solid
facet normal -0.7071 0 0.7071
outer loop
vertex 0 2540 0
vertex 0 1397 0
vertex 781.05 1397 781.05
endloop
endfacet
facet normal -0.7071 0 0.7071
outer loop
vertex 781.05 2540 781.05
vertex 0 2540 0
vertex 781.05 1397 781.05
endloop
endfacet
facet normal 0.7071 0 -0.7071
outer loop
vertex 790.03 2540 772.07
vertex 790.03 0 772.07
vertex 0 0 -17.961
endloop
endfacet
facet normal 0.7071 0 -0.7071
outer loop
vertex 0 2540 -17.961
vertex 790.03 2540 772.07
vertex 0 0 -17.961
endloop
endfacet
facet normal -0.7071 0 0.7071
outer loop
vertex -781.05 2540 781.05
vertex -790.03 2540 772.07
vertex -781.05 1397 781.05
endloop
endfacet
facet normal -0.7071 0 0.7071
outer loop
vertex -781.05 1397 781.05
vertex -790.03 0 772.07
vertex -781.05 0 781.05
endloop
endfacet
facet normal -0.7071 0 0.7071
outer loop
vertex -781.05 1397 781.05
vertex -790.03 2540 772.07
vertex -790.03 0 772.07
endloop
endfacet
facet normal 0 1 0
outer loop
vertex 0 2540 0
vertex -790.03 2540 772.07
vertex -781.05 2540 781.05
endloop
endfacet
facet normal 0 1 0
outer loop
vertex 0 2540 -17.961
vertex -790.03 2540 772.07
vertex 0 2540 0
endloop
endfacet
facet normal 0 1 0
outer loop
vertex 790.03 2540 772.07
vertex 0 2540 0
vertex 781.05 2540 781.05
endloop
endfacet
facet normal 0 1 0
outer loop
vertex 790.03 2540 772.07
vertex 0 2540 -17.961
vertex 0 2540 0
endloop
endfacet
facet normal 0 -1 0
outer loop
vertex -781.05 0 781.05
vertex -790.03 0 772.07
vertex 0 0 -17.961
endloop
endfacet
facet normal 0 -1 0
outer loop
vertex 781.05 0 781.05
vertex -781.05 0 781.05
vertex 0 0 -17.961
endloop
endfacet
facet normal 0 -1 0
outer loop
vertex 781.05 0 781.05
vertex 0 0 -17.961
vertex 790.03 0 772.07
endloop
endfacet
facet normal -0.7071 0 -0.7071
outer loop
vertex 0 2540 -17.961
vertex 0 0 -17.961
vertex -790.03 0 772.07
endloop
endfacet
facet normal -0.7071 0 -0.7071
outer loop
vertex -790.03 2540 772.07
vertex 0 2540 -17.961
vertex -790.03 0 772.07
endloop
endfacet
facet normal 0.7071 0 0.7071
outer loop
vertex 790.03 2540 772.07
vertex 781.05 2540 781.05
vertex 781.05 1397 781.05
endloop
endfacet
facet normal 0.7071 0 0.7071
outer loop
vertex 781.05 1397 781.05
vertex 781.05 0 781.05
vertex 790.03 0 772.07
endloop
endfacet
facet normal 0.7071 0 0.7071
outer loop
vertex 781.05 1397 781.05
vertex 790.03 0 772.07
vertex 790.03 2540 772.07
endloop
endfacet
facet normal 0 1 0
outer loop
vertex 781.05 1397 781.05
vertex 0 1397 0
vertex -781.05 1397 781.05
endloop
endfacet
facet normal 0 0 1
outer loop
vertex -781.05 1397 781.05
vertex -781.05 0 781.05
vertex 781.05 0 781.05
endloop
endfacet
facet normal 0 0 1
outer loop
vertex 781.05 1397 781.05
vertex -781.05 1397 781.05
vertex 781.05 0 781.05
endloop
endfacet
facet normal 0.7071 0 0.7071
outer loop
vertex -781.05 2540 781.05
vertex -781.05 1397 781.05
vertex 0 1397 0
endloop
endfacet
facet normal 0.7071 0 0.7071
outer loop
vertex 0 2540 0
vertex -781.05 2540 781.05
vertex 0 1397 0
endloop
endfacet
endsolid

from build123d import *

# Parameters (mm, degrees)
BOSS_EXTRUDE1_DEPTH = 1397
BOSS_EXTRUDE2_DEPTH = 2540


with BuildPart() as part:
    # Sketch2 → Boss-Extrude1 (new body)
    with BuildSketch(Plane(origin=(0, 0, 0), x_dir=(1, 0, 0), z_dir=(0, 1, 0))):
        Polygon((0, 0), (-781.05, -781.05), (781.05, -781.05), align=None)
    extrude(amount=BOSS_EXTRUDE1_DEPTH)

    # Sketch3 → Boss-Extrude2 (add)
    with BuildSketch(Plane(origin=(0, 0, 0), x_dir=(1, 0, 0), z_dir=(0, 1, 0))):
        Polygon((790.030256121, -772.069743879), (0, 17.960512242), (-790.030256121, -772.069743879), (-781.05, -781.05), (0, 0), (781.05, -781.05), align=None)
    extrude(amount=BOSS_EXTRUDE2_DEPTH)


solid = part.part
